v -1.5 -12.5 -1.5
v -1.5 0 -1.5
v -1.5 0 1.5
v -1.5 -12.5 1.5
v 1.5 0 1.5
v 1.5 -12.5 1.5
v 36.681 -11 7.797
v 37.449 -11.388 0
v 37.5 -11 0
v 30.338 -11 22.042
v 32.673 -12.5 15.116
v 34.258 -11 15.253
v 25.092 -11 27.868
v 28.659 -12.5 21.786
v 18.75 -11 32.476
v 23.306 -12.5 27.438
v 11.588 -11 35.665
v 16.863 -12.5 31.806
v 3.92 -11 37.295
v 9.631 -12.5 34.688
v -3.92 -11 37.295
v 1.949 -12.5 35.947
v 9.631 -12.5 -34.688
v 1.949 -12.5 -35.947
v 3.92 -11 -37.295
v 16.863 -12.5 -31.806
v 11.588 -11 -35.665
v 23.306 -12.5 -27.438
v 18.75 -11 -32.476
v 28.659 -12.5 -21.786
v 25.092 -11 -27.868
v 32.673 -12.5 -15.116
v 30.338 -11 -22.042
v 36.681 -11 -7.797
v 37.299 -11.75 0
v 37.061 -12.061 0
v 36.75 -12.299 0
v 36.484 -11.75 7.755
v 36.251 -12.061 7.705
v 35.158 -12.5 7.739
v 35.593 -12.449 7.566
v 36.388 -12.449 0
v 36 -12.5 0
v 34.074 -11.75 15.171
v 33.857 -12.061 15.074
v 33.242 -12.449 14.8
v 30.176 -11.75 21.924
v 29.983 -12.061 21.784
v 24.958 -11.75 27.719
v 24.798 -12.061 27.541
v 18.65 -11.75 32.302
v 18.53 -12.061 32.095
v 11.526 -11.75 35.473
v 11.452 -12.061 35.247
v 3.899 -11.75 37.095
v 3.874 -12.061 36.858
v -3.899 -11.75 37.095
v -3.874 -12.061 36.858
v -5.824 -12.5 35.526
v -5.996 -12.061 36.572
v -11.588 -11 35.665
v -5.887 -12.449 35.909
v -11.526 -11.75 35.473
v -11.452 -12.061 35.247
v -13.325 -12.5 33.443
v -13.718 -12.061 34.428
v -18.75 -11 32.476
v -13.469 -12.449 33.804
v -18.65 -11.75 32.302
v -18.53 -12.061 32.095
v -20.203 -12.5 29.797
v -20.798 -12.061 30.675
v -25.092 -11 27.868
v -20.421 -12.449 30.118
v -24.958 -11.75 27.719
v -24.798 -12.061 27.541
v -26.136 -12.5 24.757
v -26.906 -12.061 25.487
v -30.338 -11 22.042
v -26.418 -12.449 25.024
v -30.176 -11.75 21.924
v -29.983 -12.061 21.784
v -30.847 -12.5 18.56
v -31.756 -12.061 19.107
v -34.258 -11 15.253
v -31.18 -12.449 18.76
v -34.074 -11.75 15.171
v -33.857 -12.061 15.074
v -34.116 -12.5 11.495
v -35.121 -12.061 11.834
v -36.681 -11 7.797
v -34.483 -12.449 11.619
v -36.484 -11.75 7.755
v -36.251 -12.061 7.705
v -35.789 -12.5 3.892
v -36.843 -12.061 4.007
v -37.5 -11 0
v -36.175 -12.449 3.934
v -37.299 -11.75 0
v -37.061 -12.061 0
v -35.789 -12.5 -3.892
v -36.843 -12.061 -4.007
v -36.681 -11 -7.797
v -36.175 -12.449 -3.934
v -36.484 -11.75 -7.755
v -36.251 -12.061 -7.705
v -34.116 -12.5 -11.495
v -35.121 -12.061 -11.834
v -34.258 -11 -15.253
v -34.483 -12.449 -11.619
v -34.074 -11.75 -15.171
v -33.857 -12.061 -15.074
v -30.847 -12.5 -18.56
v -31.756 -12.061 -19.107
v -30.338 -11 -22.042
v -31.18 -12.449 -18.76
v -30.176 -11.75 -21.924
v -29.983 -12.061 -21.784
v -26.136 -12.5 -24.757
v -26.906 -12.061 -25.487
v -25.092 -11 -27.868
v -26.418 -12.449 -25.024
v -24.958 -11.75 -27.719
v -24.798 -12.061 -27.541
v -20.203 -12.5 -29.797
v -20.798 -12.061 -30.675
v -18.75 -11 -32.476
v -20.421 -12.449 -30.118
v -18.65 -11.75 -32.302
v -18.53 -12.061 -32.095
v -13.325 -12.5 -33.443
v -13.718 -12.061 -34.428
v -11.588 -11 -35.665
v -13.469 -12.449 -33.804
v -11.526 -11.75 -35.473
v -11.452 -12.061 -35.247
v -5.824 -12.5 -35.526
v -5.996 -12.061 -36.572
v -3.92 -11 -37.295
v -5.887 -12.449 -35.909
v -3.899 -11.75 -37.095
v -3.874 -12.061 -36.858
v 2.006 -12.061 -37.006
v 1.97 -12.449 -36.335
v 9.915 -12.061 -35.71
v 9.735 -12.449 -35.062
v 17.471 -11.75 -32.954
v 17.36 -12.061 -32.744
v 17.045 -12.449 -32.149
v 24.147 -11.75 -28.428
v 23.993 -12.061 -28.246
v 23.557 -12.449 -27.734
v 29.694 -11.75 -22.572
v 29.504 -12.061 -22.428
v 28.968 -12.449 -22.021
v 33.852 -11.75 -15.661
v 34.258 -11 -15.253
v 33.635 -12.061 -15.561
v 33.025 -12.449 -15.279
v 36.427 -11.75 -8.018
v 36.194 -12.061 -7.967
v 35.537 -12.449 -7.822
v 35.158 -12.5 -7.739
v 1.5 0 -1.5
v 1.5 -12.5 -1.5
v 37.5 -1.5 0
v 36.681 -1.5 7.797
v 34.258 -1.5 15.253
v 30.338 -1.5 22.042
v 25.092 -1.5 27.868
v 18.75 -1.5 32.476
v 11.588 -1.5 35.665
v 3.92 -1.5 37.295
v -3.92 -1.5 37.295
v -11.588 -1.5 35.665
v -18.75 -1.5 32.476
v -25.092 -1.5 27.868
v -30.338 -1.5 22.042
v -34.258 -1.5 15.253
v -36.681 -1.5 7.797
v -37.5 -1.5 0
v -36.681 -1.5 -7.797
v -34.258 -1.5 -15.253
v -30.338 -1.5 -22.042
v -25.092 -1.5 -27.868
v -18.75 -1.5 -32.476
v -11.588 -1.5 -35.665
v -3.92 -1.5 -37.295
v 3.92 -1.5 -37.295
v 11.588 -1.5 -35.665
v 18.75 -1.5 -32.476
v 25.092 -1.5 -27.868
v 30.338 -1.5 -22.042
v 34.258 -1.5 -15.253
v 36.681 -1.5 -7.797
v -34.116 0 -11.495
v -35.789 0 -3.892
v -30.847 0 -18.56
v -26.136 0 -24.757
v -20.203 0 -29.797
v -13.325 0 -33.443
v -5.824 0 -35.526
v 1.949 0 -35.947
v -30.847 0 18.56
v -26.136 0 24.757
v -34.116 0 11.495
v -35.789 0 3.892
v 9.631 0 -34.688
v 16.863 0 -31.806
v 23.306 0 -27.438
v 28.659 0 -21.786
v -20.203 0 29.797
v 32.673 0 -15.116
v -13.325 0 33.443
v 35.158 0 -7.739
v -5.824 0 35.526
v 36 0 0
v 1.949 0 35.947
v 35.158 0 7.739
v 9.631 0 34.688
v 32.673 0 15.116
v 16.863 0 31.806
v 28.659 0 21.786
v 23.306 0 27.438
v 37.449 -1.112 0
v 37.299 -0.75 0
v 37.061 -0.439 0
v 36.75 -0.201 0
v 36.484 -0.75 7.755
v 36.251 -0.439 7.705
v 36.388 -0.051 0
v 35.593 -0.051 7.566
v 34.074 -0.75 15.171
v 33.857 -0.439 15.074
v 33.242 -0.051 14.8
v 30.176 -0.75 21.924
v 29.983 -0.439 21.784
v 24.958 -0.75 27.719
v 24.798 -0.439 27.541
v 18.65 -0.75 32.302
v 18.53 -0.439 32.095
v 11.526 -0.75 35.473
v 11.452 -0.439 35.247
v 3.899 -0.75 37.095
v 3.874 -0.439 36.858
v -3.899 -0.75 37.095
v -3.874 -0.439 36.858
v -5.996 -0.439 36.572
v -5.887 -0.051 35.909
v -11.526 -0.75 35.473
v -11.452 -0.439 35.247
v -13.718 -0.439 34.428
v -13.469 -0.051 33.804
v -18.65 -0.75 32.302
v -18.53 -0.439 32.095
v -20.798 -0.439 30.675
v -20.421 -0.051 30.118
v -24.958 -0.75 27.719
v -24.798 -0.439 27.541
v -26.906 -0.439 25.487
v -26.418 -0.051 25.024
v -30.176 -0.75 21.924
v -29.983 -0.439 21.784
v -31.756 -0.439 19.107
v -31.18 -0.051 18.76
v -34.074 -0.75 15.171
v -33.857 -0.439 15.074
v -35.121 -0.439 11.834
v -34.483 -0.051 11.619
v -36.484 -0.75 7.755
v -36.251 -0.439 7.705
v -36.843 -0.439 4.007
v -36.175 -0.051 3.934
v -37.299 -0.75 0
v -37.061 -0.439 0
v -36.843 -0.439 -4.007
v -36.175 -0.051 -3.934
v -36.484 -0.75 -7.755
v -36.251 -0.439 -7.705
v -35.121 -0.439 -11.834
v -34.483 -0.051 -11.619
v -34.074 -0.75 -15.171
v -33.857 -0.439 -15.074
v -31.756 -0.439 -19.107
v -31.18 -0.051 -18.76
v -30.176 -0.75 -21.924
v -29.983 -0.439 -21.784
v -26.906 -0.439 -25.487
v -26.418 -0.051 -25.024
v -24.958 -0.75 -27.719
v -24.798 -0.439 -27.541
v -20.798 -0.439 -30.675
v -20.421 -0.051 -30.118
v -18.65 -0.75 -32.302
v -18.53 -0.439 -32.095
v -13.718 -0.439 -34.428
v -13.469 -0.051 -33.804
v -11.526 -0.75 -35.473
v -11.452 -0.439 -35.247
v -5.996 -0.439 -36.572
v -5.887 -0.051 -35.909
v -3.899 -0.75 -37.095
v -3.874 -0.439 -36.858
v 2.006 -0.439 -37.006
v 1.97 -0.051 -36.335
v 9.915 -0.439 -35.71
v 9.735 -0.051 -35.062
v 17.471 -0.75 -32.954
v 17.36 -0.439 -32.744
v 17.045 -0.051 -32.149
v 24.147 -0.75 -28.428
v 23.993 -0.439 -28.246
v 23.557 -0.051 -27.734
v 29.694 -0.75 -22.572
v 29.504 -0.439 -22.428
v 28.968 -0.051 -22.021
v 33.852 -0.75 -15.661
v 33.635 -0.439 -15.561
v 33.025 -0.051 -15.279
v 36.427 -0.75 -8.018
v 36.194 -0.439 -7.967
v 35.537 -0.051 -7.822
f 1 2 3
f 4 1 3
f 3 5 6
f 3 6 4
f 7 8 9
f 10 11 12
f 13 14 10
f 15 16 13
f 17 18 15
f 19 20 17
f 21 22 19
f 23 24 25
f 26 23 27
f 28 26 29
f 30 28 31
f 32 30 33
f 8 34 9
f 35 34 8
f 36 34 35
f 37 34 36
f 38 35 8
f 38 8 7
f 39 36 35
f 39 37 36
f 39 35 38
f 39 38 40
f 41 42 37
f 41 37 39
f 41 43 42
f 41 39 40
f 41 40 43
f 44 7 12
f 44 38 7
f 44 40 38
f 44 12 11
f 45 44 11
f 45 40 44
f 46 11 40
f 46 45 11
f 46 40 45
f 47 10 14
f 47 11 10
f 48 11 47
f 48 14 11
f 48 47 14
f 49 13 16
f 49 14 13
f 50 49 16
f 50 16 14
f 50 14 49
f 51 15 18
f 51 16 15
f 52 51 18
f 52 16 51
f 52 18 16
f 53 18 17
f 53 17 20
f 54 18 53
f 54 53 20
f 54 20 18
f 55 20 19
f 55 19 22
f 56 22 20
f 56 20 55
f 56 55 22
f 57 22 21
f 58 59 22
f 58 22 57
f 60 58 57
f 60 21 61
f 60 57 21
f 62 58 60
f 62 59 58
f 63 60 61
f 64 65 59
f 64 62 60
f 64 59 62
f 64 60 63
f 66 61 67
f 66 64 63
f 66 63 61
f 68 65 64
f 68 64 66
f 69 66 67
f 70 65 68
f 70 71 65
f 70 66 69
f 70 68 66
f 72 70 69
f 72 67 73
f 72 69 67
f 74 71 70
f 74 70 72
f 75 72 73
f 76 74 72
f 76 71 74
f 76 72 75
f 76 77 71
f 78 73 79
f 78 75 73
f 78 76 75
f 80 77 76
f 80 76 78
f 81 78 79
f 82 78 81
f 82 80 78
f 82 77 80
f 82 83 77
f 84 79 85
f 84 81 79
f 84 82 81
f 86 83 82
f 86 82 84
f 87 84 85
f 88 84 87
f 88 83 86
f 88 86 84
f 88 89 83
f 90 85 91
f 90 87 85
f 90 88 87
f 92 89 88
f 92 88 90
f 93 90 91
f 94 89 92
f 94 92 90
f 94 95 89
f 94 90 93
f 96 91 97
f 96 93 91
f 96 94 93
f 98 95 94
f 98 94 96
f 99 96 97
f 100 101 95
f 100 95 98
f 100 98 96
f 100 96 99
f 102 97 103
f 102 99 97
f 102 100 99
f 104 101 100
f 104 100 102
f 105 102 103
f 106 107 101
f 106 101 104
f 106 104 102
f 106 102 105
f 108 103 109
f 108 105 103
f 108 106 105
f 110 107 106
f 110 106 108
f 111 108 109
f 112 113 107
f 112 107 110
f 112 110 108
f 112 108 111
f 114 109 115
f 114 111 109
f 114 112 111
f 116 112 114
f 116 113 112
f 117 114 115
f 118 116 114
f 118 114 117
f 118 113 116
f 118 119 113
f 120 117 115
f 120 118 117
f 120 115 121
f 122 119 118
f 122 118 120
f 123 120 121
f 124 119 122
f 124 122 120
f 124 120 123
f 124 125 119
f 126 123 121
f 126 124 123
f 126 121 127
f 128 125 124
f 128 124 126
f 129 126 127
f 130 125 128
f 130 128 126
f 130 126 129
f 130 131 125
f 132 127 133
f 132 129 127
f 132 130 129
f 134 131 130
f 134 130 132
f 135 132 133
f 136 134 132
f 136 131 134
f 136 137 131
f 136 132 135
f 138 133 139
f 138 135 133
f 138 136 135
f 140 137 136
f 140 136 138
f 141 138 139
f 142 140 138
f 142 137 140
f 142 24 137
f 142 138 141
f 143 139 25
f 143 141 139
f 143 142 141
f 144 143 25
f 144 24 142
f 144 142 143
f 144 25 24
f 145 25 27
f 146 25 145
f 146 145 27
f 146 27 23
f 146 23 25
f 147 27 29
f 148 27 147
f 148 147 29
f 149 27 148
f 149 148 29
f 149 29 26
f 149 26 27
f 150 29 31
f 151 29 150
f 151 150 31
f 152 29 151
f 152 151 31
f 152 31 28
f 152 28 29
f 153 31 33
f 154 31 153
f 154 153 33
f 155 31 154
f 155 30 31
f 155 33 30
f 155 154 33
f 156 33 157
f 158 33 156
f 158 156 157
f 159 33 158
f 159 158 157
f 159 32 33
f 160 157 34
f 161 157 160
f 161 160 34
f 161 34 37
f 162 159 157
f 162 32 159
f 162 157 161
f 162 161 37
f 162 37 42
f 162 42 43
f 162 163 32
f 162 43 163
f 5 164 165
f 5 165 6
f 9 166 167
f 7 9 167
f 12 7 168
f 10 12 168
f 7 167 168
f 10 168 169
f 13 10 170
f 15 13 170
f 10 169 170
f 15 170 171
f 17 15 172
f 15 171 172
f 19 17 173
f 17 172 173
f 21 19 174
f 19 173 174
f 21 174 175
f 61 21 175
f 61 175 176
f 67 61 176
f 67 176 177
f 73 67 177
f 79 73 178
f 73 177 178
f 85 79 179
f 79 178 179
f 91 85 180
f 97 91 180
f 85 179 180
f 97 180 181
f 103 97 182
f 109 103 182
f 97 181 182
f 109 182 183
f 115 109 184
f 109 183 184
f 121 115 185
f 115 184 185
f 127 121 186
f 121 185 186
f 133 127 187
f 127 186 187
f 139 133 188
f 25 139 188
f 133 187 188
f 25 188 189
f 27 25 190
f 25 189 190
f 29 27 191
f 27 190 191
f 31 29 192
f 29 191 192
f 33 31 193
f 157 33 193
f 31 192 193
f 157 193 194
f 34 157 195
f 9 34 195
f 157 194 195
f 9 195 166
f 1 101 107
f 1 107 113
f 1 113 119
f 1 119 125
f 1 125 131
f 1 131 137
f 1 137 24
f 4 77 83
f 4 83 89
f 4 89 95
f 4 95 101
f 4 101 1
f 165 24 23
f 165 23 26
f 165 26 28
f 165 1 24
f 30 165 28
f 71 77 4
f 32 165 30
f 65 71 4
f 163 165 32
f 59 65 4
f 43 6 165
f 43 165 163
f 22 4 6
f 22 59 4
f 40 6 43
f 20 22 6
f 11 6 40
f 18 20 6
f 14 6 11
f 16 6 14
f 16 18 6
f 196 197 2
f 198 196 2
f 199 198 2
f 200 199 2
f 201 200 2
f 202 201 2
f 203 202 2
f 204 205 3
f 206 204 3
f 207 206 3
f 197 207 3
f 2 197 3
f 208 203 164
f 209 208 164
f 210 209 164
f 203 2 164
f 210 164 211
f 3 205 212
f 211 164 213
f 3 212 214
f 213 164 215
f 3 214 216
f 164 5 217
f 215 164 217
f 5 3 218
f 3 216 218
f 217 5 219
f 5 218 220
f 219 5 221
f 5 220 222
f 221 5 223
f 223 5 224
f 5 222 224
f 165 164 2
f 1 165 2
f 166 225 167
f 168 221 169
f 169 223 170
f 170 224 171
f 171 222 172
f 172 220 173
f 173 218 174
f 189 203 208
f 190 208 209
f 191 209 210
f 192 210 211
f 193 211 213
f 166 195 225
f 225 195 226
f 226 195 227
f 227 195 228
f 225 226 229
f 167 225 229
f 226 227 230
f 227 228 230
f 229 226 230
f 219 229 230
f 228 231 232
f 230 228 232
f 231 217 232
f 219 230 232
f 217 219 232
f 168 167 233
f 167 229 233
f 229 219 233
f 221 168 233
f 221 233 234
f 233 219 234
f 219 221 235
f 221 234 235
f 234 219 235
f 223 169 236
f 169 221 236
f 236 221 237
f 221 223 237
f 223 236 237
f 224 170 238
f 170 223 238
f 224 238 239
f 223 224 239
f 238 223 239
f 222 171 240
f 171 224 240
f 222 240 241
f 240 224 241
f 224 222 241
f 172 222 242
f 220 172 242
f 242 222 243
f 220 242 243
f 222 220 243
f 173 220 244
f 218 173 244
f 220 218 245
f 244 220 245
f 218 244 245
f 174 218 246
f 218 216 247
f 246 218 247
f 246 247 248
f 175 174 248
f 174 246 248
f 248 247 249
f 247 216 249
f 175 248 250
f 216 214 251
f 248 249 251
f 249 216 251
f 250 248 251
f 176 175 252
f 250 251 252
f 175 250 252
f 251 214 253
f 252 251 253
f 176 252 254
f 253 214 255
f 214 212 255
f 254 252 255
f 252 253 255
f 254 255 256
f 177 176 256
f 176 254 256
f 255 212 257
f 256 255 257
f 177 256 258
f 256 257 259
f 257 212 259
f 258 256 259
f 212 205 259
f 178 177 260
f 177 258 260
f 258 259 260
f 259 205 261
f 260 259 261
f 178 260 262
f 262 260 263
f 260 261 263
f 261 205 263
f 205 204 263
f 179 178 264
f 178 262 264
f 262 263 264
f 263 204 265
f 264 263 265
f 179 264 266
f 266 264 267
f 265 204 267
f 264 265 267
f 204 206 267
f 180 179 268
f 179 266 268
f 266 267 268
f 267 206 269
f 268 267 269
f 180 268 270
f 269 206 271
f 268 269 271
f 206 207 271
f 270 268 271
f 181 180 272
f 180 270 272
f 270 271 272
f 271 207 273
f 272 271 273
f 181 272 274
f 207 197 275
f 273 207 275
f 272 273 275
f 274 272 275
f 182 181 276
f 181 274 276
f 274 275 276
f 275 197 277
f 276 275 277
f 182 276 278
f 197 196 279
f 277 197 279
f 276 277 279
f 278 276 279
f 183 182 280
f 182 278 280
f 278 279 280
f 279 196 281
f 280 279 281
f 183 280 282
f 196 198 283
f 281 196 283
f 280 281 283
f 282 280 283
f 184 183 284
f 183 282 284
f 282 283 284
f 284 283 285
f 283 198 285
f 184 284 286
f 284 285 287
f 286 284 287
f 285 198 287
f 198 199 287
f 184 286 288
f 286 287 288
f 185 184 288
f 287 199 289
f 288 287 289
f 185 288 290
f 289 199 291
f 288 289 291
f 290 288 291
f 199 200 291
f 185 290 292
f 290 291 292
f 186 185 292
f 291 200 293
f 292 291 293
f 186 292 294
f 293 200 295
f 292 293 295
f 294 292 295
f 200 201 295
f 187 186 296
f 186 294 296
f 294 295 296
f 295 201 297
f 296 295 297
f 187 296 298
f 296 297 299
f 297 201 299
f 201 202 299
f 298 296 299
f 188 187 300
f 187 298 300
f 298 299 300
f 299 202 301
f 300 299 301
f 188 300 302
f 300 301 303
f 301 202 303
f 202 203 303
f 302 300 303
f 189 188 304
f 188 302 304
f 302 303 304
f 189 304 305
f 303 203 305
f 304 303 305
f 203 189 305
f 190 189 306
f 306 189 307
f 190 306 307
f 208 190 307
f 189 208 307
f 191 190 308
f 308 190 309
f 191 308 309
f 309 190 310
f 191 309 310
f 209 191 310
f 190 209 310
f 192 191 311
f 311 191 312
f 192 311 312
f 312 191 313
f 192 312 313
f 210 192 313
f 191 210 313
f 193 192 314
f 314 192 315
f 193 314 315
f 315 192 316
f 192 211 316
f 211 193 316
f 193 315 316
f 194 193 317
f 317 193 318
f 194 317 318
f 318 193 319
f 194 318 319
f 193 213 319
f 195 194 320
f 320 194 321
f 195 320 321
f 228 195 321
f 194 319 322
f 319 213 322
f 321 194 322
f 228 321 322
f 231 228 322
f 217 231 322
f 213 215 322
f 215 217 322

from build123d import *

# Parameters (mm, degrees)
F0_R     = 37.5
F1_DEPTH = 12.5
F2_W     = 3
F2_H     = 3
F3_DEPTH = 12.5
F4_R     = 1.5


with BuildPart() as f1:
    # F0 (on Front) → F1 (new body)
    with BuildSketch(Plane.XZ):
        Circle(F0_R)
    extrude(amount=F1_DEPTH)

    # F2 (on face) → F3 (cut, through all)
    with BuildSketch(Plane(origin=(0, 0, 0), x_dir=(-1, 0, 0), z_dir=(0, 1, 0))):
        Rectangle(F2_W, F2_H)
    extrude(amount=-F3_DEPTH, mode=Mode.SUBTRACT)

    # F4
    f4_edges = [f1.edges().sort_by_distance(p)[0] for p in [
        (-37.5, 0, 0),
        (-37.5, -12.5, 0),
    ]]
    fillet(f4_edges, radius=F4_R)


solid = f1.part
